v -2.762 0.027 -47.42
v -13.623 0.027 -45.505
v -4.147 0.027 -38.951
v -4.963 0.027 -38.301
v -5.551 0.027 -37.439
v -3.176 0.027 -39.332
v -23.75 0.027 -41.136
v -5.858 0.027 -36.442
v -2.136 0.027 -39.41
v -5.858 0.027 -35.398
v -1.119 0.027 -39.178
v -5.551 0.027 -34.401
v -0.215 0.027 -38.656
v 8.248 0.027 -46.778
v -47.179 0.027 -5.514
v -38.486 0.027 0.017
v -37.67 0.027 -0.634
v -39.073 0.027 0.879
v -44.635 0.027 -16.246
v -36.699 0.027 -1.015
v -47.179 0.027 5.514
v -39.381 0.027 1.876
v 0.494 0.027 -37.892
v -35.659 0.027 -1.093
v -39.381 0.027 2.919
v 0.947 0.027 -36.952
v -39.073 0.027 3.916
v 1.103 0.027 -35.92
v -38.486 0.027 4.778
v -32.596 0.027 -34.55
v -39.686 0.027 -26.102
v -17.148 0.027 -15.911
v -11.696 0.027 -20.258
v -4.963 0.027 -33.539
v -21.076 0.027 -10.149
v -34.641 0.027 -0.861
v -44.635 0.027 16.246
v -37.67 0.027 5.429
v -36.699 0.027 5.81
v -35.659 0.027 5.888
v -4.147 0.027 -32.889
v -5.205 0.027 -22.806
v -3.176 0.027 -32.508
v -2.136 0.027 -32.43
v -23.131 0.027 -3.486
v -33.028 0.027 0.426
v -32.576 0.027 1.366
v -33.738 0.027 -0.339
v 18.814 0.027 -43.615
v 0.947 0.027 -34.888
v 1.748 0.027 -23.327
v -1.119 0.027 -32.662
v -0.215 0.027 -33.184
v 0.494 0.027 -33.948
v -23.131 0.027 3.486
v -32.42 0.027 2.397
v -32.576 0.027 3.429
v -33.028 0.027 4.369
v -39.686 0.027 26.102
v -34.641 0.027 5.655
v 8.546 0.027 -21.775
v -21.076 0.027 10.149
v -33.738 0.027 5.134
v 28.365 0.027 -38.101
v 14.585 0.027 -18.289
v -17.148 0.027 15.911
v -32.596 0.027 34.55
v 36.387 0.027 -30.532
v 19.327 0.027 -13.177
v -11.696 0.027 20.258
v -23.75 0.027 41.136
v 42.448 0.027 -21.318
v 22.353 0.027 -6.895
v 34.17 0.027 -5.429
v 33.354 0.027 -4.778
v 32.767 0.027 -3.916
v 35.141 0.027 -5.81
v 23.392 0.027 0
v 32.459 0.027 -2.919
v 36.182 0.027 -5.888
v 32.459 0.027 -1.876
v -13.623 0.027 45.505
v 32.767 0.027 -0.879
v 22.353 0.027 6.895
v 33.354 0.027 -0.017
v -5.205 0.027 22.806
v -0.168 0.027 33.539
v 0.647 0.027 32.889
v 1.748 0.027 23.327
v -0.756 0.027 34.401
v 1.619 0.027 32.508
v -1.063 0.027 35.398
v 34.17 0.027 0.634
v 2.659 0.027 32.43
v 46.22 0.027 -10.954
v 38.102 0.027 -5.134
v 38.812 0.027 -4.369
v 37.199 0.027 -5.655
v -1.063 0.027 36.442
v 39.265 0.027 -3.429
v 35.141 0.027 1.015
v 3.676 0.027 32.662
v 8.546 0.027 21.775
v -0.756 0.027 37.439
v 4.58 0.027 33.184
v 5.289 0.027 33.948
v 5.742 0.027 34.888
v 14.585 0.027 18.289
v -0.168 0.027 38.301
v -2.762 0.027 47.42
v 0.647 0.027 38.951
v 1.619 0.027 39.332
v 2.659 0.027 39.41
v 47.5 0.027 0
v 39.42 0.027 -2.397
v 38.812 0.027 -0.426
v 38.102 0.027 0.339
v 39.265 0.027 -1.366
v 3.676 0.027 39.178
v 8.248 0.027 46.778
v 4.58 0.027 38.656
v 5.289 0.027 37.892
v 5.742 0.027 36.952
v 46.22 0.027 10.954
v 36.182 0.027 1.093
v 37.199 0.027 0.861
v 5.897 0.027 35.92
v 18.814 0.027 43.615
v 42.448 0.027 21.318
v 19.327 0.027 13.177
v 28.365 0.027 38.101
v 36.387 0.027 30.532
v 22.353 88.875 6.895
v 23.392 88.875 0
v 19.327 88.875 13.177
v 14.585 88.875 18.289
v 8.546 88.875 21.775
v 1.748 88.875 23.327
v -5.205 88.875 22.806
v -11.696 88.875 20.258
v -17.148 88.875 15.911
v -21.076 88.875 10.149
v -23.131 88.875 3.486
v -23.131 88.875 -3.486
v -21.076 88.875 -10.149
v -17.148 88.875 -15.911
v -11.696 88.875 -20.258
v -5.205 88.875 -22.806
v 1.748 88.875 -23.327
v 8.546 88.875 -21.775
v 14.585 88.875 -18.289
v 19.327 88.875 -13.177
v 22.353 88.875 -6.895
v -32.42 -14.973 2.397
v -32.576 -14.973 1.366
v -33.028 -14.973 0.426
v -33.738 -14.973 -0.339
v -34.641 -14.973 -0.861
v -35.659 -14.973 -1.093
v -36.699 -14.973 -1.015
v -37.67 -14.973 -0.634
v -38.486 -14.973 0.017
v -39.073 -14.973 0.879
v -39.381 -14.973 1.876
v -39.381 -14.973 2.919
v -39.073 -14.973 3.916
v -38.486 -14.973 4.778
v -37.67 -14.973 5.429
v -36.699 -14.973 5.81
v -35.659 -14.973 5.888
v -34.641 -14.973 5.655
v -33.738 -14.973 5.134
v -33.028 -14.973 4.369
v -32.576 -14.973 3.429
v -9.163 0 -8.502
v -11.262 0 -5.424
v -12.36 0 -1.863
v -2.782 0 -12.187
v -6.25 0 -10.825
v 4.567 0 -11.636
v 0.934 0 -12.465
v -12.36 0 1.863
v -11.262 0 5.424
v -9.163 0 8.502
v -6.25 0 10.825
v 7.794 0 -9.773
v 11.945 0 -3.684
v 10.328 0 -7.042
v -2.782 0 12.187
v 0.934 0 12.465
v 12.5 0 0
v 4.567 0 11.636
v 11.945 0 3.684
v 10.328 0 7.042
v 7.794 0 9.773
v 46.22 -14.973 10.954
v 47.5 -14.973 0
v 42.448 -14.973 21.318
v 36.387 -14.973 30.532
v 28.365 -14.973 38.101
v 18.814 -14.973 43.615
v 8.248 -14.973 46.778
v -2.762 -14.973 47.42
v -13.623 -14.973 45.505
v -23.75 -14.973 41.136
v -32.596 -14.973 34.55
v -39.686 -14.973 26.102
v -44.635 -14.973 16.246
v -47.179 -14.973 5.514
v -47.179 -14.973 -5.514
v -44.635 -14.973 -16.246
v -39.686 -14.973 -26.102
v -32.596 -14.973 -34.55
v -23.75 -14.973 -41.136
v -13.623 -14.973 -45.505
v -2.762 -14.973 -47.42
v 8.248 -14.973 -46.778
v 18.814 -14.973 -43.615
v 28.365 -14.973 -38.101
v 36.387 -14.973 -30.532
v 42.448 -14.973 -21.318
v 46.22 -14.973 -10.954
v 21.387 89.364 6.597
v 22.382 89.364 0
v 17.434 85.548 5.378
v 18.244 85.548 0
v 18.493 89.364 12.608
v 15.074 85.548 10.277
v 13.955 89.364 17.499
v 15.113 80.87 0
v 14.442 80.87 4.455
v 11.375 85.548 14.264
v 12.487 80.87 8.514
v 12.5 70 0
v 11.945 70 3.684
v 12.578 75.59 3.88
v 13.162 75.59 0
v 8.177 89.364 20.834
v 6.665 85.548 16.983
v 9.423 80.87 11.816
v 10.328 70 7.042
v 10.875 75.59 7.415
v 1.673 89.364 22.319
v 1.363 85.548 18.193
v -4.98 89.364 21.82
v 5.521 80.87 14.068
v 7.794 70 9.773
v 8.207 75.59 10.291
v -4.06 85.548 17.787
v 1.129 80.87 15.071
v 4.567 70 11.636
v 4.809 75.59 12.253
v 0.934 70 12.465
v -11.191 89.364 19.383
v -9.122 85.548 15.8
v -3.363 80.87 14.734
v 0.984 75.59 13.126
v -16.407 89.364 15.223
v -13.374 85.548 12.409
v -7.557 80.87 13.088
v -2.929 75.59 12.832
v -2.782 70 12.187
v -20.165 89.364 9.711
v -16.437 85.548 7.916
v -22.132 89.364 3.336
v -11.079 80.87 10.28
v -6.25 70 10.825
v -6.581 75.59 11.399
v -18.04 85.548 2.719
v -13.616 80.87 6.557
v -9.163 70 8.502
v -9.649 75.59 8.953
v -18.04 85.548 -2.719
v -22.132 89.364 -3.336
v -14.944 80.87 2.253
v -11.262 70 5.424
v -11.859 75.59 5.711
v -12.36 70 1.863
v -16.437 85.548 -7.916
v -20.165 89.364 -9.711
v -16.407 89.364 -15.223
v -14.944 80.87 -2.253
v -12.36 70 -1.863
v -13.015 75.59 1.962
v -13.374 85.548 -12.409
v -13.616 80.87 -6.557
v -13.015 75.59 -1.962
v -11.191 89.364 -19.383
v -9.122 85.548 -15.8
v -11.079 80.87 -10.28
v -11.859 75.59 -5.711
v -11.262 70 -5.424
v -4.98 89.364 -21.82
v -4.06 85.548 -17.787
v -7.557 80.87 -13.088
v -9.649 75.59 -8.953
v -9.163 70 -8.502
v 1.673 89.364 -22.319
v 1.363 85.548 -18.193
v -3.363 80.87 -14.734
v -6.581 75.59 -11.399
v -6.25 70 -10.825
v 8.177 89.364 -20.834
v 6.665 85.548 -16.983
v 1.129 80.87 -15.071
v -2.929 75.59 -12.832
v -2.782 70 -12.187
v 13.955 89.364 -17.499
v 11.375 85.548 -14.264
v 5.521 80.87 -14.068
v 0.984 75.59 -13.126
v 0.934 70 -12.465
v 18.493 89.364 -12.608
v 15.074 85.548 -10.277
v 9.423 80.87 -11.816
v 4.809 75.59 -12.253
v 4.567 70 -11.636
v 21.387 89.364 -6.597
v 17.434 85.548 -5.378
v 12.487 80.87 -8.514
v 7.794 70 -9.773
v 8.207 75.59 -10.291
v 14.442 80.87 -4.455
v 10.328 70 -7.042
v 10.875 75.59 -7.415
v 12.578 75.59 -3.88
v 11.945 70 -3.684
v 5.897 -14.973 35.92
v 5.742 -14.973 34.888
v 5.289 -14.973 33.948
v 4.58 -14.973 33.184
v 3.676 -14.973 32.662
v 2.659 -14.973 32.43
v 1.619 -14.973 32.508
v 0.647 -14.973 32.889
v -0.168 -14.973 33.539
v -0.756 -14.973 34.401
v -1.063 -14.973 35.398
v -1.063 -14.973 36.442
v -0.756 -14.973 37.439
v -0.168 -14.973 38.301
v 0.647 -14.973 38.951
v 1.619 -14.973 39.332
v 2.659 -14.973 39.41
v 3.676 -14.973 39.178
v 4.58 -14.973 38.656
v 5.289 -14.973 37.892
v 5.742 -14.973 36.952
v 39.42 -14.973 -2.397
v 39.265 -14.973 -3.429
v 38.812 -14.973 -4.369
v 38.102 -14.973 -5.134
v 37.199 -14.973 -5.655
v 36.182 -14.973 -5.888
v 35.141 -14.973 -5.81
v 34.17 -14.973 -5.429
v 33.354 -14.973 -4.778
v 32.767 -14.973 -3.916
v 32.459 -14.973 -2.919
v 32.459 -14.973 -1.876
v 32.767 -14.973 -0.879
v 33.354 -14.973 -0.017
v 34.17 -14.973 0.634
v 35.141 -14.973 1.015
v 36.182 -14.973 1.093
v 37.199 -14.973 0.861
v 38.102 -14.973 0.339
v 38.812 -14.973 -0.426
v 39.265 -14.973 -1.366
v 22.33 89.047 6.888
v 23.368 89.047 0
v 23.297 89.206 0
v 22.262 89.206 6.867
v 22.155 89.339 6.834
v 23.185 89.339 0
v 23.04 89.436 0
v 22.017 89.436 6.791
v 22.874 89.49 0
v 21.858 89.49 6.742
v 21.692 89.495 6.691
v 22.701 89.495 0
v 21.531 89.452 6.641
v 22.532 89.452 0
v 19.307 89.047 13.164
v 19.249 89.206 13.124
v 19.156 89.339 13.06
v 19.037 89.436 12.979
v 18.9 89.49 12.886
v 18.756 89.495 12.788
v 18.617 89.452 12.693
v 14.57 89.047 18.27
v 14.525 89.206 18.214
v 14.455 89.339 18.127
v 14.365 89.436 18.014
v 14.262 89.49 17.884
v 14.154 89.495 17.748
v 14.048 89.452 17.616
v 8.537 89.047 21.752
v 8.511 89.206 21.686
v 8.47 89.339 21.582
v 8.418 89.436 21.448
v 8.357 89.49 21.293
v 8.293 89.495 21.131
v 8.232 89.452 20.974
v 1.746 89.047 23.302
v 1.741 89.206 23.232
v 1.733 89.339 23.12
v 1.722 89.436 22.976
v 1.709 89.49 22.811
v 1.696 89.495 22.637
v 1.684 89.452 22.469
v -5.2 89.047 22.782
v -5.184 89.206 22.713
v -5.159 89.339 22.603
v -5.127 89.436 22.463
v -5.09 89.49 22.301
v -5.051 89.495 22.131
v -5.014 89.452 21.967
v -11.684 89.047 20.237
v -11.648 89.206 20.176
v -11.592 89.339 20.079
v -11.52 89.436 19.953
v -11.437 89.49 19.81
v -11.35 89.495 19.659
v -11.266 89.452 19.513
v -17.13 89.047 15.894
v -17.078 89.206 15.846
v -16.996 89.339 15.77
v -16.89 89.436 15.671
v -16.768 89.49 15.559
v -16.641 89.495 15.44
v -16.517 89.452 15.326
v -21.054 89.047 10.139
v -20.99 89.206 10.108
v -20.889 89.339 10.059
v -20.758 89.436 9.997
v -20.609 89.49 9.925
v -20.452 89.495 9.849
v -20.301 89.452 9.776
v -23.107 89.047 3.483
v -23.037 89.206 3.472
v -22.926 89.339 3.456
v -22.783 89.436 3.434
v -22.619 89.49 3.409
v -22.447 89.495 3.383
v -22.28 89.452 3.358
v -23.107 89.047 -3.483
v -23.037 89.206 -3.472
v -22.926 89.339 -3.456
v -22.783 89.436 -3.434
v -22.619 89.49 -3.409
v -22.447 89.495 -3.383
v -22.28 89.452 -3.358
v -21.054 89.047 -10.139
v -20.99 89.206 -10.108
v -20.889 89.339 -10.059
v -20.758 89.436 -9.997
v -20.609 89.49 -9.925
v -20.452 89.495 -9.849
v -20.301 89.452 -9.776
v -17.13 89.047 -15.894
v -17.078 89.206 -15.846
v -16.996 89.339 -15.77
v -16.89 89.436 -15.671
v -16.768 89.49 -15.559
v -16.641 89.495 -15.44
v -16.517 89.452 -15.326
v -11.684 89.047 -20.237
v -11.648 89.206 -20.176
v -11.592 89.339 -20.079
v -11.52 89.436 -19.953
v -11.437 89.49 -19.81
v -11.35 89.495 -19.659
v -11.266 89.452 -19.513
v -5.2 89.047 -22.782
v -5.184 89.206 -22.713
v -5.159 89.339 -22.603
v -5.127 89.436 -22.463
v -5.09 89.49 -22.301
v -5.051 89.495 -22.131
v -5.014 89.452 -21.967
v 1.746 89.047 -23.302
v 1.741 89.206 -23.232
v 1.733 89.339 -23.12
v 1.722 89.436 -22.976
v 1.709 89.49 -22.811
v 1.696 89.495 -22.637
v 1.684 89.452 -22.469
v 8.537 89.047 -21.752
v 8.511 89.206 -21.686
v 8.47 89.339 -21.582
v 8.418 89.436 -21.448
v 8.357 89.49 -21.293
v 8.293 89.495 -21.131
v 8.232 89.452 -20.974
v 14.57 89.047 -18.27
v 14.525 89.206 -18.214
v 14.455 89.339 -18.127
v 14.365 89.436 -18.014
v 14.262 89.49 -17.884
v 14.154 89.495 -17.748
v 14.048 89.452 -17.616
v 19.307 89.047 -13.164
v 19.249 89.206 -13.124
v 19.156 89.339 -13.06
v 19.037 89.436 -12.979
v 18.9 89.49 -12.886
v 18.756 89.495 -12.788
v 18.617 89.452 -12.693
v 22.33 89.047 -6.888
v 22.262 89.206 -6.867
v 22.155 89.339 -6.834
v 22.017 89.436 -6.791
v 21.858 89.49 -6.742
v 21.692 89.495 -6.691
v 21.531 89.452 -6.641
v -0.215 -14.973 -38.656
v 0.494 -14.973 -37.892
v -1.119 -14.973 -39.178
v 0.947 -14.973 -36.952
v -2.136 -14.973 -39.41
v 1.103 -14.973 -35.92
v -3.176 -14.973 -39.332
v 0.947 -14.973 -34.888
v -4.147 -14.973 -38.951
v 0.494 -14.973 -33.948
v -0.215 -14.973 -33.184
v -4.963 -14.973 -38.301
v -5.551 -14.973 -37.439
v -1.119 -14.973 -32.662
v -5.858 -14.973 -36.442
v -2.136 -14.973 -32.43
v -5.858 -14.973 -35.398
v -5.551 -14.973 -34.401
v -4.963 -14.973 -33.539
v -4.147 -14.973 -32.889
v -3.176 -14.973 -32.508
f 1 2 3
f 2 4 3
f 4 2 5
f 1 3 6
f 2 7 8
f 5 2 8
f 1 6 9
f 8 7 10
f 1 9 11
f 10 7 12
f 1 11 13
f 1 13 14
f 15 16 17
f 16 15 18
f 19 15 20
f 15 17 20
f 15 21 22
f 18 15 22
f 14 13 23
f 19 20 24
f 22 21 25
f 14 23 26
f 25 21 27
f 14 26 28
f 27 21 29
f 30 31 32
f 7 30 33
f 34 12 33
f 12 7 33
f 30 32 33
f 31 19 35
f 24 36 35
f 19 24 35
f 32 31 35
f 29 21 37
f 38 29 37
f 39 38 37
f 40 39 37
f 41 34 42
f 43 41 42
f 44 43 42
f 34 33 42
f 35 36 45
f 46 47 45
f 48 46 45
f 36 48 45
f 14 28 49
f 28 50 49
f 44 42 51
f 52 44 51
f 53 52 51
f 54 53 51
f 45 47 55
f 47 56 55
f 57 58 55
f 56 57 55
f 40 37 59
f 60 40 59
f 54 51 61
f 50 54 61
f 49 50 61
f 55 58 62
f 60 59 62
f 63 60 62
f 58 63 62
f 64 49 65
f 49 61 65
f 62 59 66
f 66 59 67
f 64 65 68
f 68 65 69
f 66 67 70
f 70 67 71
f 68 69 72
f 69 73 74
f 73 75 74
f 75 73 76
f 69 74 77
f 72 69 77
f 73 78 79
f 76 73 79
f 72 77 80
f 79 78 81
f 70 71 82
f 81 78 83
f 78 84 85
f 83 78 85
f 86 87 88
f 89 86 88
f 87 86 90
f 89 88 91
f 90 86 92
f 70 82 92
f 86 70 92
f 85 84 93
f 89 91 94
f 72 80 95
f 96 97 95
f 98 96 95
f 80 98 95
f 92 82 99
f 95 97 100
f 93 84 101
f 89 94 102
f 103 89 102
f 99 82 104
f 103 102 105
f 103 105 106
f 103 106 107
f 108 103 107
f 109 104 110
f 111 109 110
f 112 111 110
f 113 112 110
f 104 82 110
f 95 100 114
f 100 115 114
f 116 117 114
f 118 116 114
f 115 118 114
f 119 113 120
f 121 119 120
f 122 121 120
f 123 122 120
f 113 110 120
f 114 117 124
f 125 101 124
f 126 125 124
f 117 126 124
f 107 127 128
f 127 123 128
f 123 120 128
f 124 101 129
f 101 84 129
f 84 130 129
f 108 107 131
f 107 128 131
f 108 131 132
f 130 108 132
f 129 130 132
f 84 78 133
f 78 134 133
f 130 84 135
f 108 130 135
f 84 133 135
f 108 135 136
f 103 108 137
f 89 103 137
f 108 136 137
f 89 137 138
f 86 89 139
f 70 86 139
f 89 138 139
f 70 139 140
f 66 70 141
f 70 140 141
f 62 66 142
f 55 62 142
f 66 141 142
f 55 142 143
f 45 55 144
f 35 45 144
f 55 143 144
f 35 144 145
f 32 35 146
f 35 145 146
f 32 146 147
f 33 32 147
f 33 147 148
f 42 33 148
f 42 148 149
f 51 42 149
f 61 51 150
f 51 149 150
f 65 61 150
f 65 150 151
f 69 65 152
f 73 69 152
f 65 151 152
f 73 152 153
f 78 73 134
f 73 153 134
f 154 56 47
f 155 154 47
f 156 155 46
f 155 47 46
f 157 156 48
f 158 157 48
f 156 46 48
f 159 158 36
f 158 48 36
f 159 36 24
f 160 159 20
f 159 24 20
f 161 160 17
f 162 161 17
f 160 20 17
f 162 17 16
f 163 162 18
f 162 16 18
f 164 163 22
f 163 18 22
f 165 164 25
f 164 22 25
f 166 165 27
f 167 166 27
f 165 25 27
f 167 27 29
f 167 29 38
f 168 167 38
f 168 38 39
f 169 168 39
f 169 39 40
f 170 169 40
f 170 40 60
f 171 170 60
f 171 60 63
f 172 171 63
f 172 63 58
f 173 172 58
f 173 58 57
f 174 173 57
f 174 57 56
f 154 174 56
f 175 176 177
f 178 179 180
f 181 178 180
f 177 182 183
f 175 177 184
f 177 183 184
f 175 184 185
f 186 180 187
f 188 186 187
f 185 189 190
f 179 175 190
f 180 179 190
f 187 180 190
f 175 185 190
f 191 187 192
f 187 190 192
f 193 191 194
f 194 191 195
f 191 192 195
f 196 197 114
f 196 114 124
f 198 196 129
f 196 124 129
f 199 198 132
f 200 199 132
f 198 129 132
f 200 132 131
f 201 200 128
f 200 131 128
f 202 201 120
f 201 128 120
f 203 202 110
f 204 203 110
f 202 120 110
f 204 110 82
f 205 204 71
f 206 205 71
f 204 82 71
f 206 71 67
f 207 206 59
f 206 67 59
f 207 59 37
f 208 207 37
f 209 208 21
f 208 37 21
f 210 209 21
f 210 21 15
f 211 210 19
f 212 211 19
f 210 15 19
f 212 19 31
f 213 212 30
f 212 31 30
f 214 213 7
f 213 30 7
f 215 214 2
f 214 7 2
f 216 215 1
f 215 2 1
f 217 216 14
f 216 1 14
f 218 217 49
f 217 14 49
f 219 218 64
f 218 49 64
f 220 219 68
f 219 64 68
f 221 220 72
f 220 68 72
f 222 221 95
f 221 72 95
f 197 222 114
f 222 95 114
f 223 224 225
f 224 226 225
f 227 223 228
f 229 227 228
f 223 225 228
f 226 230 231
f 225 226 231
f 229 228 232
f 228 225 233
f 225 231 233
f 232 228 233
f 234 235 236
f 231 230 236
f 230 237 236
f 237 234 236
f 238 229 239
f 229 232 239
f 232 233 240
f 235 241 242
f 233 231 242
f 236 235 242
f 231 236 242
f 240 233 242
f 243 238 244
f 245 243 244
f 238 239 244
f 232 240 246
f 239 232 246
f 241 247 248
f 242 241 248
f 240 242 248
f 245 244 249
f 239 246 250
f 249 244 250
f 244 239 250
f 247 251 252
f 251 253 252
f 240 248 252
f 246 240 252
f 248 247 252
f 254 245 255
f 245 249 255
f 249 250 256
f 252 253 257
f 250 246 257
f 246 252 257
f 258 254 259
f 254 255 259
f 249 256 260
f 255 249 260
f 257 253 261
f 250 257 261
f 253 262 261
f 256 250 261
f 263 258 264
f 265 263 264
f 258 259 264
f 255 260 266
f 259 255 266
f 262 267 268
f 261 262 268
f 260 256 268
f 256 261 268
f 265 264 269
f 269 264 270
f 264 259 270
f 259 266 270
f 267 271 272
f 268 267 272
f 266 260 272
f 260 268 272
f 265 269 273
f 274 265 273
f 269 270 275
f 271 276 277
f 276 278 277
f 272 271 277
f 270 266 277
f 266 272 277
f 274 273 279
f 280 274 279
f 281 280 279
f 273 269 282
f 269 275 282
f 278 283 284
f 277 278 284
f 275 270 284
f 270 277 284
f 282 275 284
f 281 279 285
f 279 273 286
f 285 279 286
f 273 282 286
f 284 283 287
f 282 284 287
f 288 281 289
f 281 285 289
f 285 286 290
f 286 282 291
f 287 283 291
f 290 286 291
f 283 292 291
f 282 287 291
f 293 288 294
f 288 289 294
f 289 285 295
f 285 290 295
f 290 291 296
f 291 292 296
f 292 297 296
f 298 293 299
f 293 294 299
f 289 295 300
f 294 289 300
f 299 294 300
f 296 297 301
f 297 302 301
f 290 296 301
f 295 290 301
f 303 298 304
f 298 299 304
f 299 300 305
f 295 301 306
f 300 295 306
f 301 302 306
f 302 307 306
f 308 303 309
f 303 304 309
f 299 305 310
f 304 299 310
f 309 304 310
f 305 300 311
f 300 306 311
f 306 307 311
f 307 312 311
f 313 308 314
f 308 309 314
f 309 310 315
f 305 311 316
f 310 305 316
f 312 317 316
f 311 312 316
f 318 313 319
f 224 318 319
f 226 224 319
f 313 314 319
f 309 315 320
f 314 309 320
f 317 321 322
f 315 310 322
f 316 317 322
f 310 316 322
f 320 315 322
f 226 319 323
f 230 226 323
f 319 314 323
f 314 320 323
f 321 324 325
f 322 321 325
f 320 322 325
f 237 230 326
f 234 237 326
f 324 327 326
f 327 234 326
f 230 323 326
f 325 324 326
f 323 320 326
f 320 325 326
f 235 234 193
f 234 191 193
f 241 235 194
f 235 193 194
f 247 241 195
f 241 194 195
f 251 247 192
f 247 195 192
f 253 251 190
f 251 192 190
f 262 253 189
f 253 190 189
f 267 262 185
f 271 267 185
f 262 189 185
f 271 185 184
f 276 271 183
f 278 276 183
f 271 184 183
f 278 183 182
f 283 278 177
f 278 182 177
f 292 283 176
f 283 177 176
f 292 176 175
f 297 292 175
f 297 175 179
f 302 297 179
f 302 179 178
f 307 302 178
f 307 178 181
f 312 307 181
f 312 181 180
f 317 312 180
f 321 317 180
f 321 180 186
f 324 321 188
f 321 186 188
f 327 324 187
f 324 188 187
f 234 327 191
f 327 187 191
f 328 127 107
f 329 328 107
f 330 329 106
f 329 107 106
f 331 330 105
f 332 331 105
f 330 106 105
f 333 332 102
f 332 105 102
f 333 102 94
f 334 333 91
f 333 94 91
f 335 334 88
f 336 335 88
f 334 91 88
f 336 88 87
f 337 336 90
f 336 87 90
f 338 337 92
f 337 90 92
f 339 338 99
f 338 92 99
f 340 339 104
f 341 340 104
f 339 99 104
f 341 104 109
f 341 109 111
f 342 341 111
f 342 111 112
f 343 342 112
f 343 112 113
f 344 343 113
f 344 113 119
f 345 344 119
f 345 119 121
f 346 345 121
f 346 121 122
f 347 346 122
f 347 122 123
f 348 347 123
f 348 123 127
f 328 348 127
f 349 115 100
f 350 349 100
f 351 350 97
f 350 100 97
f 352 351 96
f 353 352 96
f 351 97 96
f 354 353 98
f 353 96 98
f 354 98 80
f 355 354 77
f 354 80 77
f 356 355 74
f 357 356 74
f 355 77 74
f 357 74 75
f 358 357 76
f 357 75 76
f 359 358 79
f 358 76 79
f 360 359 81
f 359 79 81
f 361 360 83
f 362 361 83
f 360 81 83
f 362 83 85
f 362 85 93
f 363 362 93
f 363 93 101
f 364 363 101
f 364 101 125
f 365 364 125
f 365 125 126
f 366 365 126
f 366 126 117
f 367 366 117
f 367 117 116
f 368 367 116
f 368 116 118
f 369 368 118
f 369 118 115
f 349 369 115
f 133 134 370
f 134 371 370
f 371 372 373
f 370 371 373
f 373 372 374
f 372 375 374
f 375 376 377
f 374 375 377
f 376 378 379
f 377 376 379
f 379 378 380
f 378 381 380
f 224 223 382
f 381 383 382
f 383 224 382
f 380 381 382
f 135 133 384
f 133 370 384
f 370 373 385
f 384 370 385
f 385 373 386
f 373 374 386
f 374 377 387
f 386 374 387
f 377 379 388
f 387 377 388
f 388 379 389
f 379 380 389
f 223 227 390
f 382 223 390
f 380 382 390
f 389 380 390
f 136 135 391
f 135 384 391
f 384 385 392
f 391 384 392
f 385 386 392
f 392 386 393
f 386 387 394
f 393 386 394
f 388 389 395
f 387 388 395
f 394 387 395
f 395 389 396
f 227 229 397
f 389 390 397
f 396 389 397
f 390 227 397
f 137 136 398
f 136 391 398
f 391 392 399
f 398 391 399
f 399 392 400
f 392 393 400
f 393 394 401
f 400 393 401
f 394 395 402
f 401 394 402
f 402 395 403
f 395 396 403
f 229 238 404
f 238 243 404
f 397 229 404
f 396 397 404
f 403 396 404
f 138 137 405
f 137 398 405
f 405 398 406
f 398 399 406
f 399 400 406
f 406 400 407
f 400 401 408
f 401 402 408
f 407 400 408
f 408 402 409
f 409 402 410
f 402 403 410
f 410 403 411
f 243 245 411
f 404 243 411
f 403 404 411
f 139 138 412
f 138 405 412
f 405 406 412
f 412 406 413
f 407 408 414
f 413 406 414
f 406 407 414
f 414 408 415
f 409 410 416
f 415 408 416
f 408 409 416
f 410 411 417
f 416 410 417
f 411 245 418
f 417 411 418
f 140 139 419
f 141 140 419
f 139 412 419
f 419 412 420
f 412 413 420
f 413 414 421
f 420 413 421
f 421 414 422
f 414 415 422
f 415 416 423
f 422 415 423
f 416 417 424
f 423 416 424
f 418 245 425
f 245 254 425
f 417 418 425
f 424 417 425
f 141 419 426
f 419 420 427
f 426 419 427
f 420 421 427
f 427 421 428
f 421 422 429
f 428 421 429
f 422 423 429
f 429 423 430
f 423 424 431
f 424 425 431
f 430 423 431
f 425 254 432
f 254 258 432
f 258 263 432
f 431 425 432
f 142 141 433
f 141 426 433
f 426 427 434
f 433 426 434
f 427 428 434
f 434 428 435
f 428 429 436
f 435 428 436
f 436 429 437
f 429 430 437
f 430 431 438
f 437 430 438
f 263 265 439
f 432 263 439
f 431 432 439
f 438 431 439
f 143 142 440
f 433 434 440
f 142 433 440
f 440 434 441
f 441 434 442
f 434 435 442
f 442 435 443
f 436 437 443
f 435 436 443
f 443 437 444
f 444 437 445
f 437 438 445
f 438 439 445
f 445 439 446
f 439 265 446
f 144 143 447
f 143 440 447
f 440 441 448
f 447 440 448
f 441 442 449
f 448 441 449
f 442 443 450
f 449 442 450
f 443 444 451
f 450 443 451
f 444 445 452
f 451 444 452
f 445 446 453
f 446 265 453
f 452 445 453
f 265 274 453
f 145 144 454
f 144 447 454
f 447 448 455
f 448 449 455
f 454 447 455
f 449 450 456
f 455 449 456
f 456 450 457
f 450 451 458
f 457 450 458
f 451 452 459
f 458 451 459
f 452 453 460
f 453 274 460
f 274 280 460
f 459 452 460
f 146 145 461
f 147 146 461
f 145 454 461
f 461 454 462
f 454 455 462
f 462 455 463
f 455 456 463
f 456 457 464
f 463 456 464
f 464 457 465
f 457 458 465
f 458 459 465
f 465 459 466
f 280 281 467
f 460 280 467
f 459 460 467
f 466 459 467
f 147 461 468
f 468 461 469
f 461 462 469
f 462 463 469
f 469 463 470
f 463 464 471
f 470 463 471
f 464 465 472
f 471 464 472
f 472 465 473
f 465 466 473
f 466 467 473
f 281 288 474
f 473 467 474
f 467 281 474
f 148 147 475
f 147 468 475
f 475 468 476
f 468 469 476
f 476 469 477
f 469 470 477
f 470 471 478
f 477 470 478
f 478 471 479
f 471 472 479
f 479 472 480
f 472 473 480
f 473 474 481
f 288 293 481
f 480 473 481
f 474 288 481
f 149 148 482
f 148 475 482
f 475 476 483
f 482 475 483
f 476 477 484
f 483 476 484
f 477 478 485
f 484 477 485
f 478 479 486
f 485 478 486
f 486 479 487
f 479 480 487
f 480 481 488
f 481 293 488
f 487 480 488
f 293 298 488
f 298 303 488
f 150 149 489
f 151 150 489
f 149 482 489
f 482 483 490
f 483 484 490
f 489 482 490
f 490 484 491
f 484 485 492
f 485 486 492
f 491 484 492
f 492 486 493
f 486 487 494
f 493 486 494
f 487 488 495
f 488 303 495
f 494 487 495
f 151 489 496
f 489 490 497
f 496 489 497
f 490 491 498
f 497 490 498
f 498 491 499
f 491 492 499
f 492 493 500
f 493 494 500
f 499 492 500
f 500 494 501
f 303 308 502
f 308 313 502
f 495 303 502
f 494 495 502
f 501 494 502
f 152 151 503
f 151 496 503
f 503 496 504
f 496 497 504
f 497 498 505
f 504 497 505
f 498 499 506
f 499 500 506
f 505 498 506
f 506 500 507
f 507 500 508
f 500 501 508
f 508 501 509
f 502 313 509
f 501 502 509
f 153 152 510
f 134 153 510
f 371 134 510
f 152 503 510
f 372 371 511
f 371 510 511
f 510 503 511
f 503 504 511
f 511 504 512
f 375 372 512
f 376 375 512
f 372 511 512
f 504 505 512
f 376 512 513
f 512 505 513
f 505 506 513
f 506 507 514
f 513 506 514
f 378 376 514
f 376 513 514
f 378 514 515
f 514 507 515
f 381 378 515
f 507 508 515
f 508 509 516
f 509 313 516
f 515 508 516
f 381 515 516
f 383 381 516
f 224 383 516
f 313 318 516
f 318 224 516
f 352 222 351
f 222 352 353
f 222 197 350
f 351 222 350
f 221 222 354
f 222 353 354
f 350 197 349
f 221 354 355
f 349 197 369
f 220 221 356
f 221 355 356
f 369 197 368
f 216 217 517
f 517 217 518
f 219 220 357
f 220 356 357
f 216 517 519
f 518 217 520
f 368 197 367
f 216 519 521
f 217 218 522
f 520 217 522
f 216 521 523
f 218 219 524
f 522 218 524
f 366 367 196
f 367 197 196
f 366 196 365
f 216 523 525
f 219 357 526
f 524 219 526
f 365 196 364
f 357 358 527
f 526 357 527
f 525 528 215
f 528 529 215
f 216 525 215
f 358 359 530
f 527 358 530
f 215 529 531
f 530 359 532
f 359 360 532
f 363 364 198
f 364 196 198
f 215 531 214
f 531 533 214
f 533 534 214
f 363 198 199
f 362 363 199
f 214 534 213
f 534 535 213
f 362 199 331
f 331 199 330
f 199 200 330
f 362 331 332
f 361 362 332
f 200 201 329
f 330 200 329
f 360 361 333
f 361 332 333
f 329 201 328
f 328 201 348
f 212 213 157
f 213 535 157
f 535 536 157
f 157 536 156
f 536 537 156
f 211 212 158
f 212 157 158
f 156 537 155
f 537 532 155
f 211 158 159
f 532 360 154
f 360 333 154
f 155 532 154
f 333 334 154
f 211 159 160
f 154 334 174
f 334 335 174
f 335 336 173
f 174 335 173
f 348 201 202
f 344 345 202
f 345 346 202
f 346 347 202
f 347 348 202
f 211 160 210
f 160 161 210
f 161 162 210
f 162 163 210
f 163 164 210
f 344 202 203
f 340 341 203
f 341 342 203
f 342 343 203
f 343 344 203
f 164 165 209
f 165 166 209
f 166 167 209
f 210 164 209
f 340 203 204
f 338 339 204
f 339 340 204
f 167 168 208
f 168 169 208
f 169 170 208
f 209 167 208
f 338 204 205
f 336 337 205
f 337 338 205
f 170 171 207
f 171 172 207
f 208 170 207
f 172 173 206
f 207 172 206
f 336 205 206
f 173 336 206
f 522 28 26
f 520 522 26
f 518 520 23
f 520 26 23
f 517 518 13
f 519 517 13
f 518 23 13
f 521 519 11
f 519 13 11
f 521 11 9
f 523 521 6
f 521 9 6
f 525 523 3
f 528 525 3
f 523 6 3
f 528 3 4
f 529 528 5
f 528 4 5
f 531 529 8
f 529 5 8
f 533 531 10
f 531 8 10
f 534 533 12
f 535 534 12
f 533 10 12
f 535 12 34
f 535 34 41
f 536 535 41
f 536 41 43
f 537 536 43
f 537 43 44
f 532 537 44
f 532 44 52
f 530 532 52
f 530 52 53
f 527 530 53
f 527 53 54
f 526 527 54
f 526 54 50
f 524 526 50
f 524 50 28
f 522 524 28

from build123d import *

# Parameters (mm, degrees)
SKETCH2_R          = 3.5
CUT_EXTRUDE1_DEPTH = 20


with BuildPart() as part:
    # Sketch1 → Revolve1 (revolve)
    with BuildSketch(Plane.XY):
        with BuildLine():
            Line((12.5, -14.9725871), (17.43319678, -14.9725871))
            Line((17.43319678, -14.9725871), (47.5, -14.9725871))
            Line((47.5, -14.9725871), (47.5, 0.0274129))
            Line((47.5, 0.0274129), (23.392075087, 0.0274129))
            Line((23.392075087, 0.0274129), (23.392075087, 88.874931748))
            ThreePointArc((23.392075087, 88.874931748), (23.040193106, 89.436291225), (22.381592941, 89.364241145))
            ThreePointArc((22.381592941, 89.364241145), (15.113172999, 80.869909317), (12.5, 70))
            Line((12.5, 70), (12.5, 0))
            Line((12.5, 0), (0, 0))
            Line((0, 0), (0, -14.9725871))
            Line((0, -14.9725871), (12.5, -14.9725871))
        make_face()
    revolve(axis=Axis((0, 0, 0), (0, -1, 0)))

    # Sketch2 → Cut-Extrude1 (cut)
    with BuildSketch(Plane(origin=(0, 0.0274129, 0), x_dir=(1, 0, 0), z_dir=(0, 1, 0))):
        with Locations((-2.39741815, 35.920083327)):
            Circle(SKETCH2_R)
        with Locations((-35.920083327, -2.39741815)):
            Circle(SKETCH2_R)
        with Locations((2.39741815, -35.920083327)):
            Circle(SKETCH2_R)
        with Locations((35.920083327, 2.39741815)):
            Circle(SKETCH2_R)
    extrude(amount=-CUT_EXTRUDE1_DEPTH, mode=Mode.SUBTRACT)


solid = part.part
